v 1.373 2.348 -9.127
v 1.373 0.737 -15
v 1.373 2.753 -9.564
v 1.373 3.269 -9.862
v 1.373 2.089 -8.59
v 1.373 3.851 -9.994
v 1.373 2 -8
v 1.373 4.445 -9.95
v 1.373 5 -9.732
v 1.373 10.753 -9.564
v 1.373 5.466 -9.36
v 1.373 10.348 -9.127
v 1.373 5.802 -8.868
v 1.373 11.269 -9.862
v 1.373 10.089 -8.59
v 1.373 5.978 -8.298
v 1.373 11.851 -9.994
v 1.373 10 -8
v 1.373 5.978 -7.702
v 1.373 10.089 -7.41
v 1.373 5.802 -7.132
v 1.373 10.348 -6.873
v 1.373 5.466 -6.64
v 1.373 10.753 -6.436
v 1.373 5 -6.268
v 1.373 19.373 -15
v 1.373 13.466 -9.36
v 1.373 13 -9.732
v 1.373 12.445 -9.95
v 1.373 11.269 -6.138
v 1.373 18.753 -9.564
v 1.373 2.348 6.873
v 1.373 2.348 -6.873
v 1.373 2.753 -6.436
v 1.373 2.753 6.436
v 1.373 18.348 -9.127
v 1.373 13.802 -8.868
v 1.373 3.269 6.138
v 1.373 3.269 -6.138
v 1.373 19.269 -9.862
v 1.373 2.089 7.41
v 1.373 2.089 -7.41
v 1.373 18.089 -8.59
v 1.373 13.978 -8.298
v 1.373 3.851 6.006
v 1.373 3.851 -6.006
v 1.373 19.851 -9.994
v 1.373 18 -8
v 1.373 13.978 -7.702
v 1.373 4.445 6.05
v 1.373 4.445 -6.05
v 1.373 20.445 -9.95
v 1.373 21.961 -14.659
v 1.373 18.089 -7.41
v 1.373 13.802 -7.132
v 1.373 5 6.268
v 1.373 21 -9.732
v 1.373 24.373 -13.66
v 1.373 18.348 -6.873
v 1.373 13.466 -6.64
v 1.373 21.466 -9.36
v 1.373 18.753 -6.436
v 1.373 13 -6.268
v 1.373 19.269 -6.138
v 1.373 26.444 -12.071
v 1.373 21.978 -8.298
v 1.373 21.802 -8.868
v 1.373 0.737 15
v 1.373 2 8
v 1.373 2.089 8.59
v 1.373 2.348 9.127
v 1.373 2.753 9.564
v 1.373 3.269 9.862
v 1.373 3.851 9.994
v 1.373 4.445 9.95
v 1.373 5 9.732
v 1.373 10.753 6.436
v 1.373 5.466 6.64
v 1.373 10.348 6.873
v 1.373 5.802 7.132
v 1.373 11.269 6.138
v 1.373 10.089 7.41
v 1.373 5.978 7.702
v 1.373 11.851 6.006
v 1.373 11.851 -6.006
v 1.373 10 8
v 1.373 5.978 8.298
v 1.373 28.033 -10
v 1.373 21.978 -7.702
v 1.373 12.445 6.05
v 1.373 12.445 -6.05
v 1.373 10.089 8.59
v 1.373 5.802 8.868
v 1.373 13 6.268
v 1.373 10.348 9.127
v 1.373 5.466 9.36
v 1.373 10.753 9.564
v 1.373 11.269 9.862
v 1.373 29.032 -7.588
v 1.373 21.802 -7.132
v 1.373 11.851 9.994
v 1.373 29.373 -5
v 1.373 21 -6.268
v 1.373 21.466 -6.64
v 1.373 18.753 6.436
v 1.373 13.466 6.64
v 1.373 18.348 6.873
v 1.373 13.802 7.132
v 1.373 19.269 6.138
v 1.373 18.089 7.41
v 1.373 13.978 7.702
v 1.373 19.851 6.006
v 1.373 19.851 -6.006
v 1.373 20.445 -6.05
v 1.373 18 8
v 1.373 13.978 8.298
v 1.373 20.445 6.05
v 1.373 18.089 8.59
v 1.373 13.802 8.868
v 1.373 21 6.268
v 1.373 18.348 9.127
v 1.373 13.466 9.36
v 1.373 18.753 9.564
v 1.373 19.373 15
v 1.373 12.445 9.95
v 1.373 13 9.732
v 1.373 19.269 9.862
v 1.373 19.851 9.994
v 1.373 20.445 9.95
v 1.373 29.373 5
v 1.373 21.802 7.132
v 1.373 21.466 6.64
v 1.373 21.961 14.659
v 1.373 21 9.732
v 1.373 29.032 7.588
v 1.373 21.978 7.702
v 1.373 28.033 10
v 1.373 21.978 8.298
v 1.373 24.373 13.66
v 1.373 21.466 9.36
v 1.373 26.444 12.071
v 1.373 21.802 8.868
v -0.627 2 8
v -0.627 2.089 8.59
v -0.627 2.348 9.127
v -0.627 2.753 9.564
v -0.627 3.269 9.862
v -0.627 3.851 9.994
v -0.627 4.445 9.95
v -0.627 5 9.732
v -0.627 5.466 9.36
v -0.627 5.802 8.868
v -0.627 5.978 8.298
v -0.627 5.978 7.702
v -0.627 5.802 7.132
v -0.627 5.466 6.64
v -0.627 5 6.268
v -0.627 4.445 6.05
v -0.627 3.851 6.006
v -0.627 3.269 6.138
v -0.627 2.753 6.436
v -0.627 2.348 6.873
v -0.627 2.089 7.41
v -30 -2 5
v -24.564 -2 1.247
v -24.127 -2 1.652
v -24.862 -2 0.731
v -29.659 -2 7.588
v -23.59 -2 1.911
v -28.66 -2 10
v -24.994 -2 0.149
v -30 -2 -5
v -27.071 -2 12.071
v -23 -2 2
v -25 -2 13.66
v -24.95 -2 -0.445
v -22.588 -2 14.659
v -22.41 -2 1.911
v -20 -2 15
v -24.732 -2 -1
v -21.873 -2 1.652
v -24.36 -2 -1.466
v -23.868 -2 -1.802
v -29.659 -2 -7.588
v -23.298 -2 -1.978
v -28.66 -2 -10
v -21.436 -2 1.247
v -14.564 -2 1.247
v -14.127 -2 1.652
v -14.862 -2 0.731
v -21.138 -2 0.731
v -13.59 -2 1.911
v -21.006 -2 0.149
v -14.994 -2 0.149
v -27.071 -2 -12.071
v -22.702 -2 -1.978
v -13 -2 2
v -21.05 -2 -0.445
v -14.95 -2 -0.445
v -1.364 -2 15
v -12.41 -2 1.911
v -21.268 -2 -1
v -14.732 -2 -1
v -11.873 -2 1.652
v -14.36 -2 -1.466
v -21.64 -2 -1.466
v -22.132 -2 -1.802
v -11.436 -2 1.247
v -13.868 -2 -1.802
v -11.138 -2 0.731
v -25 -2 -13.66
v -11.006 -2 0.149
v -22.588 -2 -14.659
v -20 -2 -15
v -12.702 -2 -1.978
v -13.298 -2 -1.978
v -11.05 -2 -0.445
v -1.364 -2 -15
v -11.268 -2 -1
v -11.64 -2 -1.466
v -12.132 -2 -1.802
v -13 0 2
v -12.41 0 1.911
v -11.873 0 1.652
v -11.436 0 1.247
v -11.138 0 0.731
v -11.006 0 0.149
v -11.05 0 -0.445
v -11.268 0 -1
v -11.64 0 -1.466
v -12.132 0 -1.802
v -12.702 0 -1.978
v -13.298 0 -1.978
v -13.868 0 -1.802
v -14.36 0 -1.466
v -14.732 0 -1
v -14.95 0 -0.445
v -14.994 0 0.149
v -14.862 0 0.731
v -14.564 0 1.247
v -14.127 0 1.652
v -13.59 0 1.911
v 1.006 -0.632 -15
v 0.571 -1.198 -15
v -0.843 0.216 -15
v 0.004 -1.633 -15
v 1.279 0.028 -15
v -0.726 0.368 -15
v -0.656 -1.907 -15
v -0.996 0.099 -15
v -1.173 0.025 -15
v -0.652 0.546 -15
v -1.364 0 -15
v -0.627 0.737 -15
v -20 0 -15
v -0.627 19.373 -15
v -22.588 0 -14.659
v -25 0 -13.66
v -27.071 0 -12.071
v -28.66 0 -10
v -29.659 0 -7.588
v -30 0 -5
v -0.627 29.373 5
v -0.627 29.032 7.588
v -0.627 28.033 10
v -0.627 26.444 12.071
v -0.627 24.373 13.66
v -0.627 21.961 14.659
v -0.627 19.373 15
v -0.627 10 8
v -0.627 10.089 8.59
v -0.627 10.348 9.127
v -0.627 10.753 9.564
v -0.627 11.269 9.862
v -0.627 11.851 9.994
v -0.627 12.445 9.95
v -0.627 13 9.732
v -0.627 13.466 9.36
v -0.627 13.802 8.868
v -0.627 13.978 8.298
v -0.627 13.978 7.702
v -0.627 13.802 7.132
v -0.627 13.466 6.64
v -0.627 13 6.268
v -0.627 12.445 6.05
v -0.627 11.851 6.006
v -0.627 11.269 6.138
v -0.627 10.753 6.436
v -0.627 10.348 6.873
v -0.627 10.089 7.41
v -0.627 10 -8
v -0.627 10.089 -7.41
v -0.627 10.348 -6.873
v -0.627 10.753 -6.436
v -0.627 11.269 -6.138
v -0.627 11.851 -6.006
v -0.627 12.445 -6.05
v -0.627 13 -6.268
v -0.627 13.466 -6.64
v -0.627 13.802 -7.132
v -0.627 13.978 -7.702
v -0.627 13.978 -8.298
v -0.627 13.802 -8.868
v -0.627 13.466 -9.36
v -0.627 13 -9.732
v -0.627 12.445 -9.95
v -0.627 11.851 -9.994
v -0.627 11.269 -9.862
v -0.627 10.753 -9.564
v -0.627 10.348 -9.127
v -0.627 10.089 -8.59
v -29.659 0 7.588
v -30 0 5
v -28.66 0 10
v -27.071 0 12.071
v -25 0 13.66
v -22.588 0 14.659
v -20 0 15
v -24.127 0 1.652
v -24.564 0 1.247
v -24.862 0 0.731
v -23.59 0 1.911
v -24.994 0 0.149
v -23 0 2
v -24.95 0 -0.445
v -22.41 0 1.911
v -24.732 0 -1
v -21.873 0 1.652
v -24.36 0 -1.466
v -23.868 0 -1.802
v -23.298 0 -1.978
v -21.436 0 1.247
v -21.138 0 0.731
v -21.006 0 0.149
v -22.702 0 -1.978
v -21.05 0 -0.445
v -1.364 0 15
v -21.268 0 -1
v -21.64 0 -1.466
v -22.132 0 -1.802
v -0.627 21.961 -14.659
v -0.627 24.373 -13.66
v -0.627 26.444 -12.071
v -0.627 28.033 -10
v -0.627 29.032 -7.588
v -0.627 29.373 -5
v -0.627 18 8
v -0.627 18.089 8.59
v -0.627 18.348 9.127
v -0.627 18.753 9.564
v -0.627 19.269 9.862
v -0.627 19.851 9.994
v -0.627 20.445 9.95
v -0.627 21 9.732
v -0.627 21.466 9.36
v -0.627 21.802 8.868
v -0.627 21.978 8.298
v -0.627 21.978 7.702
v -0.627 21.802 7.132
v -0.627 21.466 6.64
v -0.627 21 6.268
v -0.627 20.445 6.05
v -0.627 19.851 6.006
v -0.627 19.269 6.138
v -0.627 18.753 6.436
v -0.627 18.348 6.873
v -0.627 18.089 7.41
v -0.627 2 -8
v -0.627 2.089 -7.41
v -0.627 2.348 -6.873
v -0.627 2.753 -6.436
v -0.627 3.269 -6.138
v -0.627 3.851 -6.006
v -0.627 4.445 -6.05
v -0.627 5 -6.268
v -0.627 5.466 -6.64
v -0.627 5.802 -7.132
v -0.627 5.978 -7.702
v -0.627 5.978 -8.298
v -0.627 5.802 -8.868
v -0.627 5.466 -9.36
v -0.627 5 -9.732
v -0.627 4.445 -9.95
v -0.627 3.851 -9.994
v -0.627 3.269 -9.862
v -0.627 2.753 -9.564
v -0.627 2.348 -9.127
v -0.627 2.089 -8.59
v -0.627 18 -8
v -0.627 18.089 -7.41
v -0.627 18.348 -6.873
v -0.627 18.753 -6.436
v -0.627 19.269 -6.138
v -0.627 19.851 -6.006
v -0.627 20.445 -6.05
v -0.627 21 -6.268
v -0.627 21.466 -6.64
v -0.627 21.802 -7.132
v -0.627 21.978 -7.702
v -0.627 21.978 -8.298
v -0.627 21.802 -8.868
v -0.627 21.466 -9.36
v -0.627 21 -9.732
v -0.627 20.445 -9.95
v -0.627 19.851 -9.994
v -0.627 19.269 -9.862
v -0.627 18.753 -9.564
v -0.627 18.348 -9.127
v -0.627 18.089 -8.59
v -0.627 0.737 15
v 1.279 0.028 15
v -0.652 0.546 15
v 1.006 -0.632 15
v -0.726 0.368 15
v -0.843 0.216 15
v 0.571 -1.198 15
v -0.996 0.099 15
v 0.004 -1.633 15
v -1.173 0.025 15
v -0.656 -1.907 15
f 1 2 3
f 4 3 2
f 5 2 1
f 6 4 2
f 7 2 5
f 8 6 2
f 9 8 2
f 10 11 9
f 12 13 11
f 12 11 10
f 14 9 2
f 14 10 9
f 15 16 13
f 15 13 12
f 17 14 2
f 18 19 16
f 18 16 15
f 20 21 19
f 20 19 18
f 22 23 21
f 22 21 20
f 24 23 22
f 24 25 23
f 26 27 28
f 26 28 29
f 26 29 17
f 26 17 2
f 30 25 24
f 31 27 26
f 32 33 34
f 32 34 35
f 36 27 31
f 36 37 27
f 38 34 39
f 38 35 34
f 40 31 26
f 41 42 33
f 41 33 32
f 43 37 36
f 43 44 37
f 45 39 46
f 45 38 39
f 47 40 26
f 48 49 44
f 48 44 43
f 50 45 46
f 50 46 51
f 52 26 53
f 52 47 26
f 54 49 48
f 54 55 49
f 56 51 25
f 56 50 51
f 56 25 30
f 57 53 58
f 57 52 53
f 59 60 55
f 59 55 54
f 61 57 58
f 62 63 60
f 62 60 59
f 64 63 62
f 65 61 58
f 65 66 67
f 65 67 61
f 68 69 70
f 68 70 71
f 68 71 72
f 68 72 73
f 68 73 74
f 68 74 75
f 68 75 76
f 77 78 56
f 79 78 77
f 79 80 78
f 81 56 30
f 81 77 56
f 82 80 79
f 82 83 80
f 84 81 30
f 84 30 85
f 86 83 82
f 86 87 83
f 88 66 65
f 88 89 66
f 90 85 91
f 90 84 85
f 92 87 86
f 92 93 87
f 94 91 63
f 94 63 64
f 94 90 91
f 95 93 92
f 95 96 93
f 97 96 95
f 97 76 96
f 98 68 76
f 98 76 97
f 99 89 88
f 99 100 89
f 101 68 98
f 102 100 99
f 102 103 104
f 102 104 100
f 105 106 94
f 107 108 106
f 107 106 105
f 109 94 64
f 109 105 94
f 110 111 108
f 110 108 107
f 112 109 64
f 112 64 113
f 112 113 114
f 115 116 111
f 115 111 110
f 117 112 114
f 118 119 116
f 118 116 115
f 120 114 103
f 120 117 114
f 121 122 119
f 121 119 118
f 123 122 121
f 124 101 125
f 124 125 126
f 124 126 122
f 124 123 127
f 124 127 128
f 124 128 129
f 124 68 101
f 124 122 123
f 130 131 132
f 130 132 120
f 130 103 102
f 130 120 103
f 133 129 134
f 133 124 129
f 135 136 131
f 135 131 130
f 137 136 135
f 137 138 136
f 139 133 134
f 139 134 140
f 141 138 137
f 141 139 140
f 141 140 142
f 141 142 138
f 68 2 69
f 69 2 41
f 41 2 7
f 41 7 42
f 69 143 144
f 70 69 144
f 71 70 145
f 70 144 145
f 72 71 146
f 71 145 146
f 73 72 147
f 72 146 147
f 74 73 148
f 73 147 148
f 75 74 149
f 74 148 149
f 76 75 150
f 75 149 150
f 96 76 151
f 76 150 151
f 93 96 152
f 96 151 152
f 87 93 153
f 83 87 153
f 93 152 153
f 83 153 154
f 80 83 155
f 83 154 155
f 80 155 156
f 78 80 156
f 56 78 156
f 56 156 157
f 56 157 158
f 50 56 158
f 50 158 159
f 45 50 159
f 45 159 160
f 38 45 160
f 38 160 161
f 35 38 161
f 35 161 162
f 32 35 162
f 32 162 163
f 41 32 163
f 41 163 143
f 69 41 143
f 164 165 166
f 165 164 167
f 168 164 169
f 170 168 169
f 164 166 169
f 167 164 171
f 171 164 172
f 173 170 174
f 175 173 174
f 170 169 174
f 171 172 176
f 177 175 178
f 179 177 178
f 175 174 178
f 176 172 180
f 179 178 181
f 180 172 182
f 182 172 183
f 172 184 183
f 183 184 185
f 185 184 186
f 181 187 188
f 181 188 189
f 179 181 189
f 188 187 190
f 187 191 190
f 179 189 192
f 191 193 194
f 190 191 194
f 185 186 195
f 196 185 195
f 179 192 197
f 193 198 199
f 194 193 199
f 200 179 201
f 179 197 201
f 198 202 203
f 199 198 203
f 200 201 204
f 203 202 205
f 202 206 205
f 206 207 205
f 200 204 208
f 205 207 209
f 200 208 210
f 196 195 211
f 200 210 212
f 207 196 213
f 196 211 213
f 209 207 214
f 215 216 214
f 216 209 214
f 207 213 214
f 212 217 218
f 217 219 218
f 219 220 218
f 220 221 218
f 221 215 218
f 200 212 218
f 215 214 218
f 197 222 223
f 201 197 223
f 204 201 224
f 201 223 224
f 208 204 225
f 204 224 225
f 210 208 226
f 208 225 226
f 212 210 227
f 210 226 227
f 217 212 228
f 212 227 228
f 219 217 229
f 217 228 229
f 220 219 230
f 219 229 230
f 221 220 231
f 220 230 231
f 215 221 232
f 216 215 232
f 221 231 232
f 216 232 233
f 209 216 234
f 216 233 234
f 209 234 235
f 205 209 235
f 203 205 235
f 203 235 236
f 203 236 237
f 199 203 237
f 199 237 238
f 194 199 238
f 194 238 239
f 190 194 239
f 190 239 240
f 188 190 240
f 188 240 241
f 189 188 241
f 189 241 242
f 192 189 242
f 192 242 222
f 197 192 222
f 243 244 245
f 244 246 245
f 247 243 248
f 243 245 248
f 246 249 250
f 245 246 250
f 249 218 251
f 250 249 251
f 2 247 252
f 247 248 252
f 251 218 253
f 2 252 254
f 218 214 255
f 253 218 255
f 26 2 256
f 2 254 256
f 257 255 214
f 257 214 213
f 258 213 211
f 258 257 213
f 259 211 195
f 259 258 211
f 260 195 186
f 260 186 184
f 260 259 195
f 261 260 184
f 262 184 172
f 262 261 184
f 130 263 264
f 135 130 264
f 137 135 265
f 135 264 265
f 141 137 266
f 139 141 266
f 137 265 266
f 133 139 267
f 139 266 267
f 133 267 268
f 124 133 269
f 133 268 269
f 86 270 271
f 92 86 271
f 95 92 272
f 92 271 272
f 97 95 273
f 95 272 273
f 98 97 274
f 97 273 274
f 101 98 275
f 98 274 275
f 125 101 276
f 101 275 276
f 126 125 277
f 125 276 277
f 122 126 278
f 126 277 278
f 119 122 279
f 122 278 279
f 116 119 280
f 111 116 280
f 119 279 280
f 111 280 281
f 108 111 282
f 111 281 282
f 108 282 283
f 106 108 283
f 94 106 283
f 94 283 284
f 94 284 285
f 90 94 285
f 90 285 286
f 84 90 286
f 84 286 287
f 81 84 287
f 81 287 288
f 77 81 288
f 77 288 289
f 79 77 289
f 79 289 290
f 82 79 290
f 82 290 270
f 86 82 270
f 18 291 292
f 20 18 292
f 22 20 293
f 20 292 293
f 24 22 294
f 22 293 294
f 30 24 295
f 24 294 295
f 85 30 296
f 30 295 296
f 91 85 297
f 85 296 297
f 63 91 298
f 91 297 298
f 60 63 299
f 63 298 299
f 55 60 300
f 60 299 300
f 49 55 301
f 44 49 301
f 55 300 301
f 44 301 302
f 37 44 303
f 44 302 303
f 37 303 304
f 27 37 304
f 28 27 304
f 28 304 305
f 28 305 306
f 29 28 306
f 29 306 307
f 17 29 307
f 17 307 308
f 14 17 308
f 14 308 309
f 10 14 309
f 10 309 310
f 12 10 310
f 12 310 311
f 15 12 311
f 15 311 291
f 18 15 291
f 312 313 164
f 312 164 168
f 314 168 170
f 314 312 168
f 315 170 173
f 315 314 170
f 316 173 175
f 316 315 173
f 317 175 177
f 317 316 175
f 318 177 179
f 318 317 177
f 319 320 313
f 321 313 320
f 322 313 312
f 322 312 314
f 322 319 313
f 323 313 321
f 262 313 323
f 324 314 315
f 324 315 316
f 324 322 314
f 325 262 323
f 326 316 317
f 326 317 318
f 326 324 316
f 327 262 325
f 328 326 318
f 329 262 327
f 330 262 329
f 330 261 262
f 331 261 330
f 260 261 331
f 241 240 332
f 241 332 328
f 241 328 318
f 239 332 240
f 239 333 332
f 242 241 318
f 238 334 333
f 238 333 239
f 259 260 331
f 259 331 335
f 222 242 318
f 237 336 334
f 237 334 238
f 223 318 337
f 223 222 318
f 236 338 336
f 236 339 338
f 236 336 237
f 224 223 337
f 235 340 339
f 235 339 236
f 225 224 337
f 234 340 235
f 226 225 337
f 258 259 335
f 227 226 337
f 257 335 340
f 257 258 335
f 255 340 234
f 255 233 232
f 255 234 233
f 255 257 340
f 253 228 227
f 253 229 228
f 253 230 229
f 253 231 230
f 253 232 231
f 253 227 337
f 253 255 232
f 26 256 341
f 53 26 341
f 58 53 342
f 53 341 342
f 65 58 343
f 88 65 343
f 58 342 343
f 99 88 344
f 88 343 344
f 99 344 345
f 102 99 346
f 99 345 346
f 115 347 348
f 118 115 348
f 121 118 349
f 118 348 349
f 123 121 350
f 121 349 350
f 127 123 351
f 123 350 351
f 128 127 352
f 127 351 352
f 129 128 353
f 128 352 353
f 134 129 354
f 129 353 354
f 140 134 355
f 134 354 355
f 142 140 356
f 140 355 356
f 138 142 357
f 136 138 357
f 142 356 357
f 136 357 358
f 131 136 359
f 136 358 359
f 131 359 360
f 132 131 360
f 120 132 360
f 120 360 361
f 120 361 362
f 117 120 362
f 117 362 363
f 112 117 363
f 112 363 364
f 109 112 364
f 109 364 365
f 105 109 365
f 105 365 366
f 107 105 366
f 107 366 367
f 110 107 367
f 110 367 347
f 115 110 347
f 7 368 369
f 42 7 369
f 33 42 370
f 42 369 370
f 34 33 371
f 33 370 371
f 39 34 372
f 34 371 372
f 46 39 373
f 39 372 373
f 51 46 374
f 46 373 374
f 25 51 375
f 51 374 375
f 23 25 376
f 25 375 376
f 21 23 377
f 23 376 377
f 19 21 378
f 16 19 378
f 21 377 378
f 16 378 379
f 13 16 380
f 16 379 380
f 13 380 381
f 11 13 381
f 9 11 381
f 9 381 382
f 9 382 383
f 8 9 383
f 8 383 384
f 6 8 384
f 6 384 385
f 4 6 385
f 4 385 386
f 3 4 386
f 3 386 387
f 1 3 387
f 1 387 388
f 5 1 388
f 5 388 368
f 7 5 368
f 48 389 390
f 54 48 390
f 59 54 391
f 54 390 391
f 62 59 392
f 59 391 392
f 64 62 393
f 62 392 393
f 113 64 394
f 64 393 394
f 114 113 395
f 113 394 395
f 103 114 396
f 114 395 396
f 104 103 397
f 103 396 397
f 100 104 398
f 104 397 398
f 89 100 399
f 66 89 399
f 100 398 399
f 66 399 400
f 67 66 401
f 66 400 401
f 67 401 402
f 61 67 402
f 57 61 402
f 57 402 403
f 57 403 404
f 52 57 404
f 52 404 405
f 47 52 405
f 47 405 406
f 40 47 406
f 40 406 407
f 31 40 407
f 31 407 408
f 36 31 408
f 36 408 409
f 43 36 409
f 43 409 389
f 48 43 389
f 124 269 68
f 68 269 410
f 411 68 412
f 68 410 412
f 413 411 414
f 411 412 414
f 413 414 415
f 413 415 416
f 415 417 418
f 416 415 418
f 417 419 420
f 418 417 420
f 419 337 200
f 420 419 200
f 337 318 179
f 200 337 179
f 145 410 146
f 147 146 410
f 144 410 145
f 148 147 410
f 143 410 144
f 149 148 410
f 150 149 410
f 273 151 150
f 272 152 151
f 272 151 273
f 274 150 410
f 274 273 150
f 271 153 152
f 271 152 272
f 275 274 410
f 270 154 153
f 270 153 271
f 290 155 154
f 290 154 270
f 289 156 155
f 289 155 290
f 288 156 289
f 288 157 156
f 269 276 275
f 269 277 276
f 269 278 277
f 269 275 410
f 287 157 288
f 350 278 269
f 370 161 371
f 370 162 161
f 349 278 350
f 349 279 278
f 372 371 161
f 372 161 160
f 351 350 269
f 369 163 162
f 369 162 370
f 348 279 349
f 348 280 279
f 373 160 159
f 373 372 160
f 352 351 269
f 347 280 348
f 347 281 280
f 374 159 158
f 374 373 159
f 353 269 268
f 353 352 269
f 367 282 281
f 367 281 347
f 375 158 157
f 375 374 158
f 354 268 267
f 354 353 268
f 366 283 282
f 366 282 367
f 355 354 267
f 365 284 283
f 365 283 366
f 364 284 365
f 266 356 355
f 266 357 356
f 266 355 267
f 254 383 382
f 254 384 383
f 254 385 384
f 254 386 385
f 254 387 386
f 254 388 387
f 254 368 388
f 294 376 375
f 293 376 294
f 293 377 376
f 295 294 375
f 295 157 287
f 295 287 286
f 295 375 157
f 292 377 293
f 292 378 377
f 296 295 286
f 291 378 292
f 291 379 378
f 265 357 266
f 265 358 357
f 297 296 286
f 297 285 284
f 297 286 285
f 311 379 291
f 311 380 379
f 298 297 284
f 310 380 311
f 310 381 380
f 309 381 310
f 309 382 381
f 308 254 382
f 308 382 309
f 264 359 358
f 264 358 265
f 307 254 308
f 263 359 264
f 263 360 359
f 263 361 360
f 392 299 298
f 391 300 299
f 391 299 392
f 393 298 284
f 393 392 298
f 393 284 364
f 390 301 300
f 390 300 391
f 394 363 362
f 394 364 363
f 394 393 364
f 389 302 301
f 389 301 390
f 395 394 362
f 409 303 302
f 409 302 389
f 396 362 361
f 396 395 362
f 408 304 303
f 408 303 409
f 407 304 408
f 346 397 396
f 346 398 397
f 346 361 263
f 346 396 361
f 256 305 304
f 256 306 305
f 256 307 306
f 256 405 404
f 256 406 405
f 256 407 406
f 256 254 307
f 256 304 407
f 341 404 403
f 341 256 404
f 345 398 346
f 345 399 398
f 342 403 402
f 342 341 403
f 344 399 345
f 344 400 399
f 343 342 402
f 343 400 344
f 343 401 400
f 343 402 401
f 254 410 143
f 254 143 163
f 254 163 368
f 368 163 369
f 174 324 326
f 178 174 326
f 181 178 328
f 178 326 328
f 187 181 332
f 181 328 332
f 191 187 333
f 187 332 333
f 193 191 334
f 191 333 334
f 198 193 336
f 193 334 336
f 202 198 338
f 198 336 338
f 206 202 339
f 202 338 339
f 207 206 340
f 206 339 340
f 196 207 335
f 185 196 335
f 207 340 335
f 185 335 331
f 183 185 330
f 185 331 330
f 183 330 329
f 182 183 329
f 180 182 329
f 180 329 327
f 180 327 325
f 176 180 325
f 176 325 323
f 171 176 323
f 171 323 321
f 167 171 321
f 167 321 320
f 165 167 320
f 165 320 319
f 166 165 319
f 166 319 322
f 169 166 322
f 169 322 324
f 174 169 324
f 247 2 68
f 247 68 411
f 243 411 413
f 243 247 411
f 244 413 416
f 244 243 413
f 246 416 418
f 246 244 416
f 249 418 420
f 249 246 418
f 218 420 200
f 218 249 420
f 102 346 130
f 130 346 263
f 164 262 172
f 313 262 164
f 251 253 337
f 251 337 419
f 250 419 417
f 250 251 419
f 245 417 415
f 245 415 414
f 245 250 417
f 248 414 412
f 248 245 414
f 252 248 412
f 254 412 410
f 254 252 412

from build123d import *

# Parameters (mm, degrees)
BASE_FLANGE1_DEPTH       = 2
SKETCHED_START           = 1.372677549
SKETCHED_BEND1_OUTLINE_W = 2
SKETCHED_BEND1_OUTLINE_H = 30
SKETCHED_BEND1_DEPTH     = 28.627322451
SKETCHED_START_2         = -0.627322451
SKETCHED_BEND1_2_DEPTH   = 1.733838284
SKETCHED_START_3         = -1.363922451
SKETCHED_BEND1_3_DEPTH   = 2.7366
SKETCHED_START_4         = -15
SKETCHED_BEND1_4_DEPTH   = 30
SKETCH8_R                = 2
CUT_EXTRUDE1_DEPTH       = 10
SKETCH9_R                = 2
CUT_EXTRUDE2_DEPTH       = 10


with BuildPart() as part:
    # Base-Flange1: sheet metal written as solids
    # Sketch1 → Base-Flange1 (new body)
    with BuildSketch(Plane(origin=(0, 0, 0), x_dir=(1, 0, 0), z_dir=(0, 1, 0))):
        with BuildLine():
            Line((-20, -15), (20, -15))
            ThreePointArc((20, -15), (27.071067812, -12.071067812), (30, -5))
            Line((30, -5), (30, 5))
            ThreePointArc((30, 5), (27.071067812, 12.071067812), (20, 15))
            Line((20, 15), (-20, 15))
            ThreePointArc((-20, 15), (-27.071067812, 12.071067812), (-30, 5))
            Line((-30, 5), (-30, -5))
            ThreePointArc((-30, -5), (-27.071067812, -12.071067812), (-20, -15))
        make_face()
    extrude(amount=-BASE_FLANGE1_DEPTH)

    # Sketched Bend1: read off the stored shape, not the designer's step
    # Sketched Bend1 outline → Sketched Bend1 (cut)
    with BuildSketch(Plane.YZ.offset(SKETCHED_START)):
        with Locations((-1, 0)):
            Rectangle(SKETCHED_BEND1_OUTLINE_W, SKETCHED_BEND1_OUTLINE_H)
    extrude(amount=SKETCHED_BEND1_DEPTH, mode=Mode.SUBTRACT)

    # Sketched Bend1 2 outline → Sketched Bend1 2 (add)
    with BuildSketch(Plane.YZ.offset(SKETCHED_START_2)):
        with BuildLine():
            ThreePointArc((29.372677549, 5), (26.443745361, 12.071067812), (19.372677549, 15))
            Line((19.372677549, 15), (0, 15))
            Line((0, 15), (0, -15))
            Line((0, -15), (19.372677549, -15))
            ThreePointArc((19.372677549, -15), (26.443745361, -12.071067812), (29.372677549, -5))
            Line((29.372677549, -5), (29.372677549, 5))
        make_face()
    extrude(amount=SKETCHED_BEND1_2_DEPTH)

    # Sketched Bend1 3 outline → Sketched Bend1 3 (add)
    with BuildSketch(Plane.YZ.offset(SKETCHED_START_3)):
        with BuildLine():
            ThreePointArc((29.372677549, 5), (26.443745361, 12.071067812), (19.372677549, 15))
            Line((19.372677549, 15), (0, 15))
            Line((0, 15), (0, -15))
            Line((0, -15), (19.372677549, -15))
            ThreePointArc((19.372677549, -15), (26.443745361, -12.071067812), (29.372677549, -5))
            Line((29.372677549, -5), (29.372677549, 5))
        make_face()
    extrude(amount=SKETCHED_BEND1_3_DEPTH)

    # Sketched Bend1 4 outline → Sketched Bend1 4 (cut)
    with BuildSketch(Plane.XY.offset(SKETCHED_START_4)):
        with BuildLine():
            Line((-0.627322451, 0.7366), (-0.627322451, 29.372677549))
            Line((-0.627322451, 29.372677549), (-1.363922451, 29.372677549))
            Line((-1.363922451, 29.372677549), (-1.363922451, 0))
            ThreePointArc((-1.363922451, 0), (-0.843067596, 0.215745145), (-0.627322451, 0.7366))
        make_face()
        with BuildLine():
            Line((1.372677549, -2), (1.372677549, 0.7366))
            ThreePointArc((1.372677549, 0.7366), (0.571145967, -1.198468417), (-1.363922451, -2))
            Line((-1.363922451, -2), (1.372677549, -2))
        make_face()
    extrude(amount=SKETCHED_BEND1_4_DEPTH, mode=Mode.SUBTRACT)

    # Sketch8 → Cut-Extrude1 (cut)
    with BuildSketch(Plane.ZY.offset(0.627322451)):
        with Locations(Location((-8, 4, 0), (0, 0, 270))):
            Circle(SKETCH8_R)
        with Locations(Location((8, 4, 0), (0, 0, 270))):
            Circle(SKETCH8_R)
        with Locations(Location((-8, 12, 0), (0, 0, 270))):
            Circle(SKETCH8_R)
        with Locations(Location((-8, 20, 0), (0, 0, 270))):
            Circle(SKETCH8_R)
        with Locations(Location((8, 20, 0), (0, 0, 270))):
            Circle(SKETCH8_R)
        with Locations(Location((8, 12, 0), (0, 0, 270))):
            Circle(SKETCH8_R)
    extrude(amount=-CUT_EXTRUDE1_DEPTH, mode=Mode.SUBTRACT)

    # Sketch9 → Cut-Extrude2 (cut)
    with BuildSketch(Plane(origin=(0, 0, 0), x_dir=(1, 0, 0), z_dir=(0, 1, 0))):
        with Locations(Location((-23, 0, 0), (0, 0, 270))):
            Circle(SKETCH9_R)
        with Locations(Location((-13, 0, 0), (0, 0, 270))):
            Circle(SKETCH9_R)
    extrude(amount=-CUT_EXTRUDE2_DEPTH, mode=Mode.SUBTRACT)


solid = part.part
